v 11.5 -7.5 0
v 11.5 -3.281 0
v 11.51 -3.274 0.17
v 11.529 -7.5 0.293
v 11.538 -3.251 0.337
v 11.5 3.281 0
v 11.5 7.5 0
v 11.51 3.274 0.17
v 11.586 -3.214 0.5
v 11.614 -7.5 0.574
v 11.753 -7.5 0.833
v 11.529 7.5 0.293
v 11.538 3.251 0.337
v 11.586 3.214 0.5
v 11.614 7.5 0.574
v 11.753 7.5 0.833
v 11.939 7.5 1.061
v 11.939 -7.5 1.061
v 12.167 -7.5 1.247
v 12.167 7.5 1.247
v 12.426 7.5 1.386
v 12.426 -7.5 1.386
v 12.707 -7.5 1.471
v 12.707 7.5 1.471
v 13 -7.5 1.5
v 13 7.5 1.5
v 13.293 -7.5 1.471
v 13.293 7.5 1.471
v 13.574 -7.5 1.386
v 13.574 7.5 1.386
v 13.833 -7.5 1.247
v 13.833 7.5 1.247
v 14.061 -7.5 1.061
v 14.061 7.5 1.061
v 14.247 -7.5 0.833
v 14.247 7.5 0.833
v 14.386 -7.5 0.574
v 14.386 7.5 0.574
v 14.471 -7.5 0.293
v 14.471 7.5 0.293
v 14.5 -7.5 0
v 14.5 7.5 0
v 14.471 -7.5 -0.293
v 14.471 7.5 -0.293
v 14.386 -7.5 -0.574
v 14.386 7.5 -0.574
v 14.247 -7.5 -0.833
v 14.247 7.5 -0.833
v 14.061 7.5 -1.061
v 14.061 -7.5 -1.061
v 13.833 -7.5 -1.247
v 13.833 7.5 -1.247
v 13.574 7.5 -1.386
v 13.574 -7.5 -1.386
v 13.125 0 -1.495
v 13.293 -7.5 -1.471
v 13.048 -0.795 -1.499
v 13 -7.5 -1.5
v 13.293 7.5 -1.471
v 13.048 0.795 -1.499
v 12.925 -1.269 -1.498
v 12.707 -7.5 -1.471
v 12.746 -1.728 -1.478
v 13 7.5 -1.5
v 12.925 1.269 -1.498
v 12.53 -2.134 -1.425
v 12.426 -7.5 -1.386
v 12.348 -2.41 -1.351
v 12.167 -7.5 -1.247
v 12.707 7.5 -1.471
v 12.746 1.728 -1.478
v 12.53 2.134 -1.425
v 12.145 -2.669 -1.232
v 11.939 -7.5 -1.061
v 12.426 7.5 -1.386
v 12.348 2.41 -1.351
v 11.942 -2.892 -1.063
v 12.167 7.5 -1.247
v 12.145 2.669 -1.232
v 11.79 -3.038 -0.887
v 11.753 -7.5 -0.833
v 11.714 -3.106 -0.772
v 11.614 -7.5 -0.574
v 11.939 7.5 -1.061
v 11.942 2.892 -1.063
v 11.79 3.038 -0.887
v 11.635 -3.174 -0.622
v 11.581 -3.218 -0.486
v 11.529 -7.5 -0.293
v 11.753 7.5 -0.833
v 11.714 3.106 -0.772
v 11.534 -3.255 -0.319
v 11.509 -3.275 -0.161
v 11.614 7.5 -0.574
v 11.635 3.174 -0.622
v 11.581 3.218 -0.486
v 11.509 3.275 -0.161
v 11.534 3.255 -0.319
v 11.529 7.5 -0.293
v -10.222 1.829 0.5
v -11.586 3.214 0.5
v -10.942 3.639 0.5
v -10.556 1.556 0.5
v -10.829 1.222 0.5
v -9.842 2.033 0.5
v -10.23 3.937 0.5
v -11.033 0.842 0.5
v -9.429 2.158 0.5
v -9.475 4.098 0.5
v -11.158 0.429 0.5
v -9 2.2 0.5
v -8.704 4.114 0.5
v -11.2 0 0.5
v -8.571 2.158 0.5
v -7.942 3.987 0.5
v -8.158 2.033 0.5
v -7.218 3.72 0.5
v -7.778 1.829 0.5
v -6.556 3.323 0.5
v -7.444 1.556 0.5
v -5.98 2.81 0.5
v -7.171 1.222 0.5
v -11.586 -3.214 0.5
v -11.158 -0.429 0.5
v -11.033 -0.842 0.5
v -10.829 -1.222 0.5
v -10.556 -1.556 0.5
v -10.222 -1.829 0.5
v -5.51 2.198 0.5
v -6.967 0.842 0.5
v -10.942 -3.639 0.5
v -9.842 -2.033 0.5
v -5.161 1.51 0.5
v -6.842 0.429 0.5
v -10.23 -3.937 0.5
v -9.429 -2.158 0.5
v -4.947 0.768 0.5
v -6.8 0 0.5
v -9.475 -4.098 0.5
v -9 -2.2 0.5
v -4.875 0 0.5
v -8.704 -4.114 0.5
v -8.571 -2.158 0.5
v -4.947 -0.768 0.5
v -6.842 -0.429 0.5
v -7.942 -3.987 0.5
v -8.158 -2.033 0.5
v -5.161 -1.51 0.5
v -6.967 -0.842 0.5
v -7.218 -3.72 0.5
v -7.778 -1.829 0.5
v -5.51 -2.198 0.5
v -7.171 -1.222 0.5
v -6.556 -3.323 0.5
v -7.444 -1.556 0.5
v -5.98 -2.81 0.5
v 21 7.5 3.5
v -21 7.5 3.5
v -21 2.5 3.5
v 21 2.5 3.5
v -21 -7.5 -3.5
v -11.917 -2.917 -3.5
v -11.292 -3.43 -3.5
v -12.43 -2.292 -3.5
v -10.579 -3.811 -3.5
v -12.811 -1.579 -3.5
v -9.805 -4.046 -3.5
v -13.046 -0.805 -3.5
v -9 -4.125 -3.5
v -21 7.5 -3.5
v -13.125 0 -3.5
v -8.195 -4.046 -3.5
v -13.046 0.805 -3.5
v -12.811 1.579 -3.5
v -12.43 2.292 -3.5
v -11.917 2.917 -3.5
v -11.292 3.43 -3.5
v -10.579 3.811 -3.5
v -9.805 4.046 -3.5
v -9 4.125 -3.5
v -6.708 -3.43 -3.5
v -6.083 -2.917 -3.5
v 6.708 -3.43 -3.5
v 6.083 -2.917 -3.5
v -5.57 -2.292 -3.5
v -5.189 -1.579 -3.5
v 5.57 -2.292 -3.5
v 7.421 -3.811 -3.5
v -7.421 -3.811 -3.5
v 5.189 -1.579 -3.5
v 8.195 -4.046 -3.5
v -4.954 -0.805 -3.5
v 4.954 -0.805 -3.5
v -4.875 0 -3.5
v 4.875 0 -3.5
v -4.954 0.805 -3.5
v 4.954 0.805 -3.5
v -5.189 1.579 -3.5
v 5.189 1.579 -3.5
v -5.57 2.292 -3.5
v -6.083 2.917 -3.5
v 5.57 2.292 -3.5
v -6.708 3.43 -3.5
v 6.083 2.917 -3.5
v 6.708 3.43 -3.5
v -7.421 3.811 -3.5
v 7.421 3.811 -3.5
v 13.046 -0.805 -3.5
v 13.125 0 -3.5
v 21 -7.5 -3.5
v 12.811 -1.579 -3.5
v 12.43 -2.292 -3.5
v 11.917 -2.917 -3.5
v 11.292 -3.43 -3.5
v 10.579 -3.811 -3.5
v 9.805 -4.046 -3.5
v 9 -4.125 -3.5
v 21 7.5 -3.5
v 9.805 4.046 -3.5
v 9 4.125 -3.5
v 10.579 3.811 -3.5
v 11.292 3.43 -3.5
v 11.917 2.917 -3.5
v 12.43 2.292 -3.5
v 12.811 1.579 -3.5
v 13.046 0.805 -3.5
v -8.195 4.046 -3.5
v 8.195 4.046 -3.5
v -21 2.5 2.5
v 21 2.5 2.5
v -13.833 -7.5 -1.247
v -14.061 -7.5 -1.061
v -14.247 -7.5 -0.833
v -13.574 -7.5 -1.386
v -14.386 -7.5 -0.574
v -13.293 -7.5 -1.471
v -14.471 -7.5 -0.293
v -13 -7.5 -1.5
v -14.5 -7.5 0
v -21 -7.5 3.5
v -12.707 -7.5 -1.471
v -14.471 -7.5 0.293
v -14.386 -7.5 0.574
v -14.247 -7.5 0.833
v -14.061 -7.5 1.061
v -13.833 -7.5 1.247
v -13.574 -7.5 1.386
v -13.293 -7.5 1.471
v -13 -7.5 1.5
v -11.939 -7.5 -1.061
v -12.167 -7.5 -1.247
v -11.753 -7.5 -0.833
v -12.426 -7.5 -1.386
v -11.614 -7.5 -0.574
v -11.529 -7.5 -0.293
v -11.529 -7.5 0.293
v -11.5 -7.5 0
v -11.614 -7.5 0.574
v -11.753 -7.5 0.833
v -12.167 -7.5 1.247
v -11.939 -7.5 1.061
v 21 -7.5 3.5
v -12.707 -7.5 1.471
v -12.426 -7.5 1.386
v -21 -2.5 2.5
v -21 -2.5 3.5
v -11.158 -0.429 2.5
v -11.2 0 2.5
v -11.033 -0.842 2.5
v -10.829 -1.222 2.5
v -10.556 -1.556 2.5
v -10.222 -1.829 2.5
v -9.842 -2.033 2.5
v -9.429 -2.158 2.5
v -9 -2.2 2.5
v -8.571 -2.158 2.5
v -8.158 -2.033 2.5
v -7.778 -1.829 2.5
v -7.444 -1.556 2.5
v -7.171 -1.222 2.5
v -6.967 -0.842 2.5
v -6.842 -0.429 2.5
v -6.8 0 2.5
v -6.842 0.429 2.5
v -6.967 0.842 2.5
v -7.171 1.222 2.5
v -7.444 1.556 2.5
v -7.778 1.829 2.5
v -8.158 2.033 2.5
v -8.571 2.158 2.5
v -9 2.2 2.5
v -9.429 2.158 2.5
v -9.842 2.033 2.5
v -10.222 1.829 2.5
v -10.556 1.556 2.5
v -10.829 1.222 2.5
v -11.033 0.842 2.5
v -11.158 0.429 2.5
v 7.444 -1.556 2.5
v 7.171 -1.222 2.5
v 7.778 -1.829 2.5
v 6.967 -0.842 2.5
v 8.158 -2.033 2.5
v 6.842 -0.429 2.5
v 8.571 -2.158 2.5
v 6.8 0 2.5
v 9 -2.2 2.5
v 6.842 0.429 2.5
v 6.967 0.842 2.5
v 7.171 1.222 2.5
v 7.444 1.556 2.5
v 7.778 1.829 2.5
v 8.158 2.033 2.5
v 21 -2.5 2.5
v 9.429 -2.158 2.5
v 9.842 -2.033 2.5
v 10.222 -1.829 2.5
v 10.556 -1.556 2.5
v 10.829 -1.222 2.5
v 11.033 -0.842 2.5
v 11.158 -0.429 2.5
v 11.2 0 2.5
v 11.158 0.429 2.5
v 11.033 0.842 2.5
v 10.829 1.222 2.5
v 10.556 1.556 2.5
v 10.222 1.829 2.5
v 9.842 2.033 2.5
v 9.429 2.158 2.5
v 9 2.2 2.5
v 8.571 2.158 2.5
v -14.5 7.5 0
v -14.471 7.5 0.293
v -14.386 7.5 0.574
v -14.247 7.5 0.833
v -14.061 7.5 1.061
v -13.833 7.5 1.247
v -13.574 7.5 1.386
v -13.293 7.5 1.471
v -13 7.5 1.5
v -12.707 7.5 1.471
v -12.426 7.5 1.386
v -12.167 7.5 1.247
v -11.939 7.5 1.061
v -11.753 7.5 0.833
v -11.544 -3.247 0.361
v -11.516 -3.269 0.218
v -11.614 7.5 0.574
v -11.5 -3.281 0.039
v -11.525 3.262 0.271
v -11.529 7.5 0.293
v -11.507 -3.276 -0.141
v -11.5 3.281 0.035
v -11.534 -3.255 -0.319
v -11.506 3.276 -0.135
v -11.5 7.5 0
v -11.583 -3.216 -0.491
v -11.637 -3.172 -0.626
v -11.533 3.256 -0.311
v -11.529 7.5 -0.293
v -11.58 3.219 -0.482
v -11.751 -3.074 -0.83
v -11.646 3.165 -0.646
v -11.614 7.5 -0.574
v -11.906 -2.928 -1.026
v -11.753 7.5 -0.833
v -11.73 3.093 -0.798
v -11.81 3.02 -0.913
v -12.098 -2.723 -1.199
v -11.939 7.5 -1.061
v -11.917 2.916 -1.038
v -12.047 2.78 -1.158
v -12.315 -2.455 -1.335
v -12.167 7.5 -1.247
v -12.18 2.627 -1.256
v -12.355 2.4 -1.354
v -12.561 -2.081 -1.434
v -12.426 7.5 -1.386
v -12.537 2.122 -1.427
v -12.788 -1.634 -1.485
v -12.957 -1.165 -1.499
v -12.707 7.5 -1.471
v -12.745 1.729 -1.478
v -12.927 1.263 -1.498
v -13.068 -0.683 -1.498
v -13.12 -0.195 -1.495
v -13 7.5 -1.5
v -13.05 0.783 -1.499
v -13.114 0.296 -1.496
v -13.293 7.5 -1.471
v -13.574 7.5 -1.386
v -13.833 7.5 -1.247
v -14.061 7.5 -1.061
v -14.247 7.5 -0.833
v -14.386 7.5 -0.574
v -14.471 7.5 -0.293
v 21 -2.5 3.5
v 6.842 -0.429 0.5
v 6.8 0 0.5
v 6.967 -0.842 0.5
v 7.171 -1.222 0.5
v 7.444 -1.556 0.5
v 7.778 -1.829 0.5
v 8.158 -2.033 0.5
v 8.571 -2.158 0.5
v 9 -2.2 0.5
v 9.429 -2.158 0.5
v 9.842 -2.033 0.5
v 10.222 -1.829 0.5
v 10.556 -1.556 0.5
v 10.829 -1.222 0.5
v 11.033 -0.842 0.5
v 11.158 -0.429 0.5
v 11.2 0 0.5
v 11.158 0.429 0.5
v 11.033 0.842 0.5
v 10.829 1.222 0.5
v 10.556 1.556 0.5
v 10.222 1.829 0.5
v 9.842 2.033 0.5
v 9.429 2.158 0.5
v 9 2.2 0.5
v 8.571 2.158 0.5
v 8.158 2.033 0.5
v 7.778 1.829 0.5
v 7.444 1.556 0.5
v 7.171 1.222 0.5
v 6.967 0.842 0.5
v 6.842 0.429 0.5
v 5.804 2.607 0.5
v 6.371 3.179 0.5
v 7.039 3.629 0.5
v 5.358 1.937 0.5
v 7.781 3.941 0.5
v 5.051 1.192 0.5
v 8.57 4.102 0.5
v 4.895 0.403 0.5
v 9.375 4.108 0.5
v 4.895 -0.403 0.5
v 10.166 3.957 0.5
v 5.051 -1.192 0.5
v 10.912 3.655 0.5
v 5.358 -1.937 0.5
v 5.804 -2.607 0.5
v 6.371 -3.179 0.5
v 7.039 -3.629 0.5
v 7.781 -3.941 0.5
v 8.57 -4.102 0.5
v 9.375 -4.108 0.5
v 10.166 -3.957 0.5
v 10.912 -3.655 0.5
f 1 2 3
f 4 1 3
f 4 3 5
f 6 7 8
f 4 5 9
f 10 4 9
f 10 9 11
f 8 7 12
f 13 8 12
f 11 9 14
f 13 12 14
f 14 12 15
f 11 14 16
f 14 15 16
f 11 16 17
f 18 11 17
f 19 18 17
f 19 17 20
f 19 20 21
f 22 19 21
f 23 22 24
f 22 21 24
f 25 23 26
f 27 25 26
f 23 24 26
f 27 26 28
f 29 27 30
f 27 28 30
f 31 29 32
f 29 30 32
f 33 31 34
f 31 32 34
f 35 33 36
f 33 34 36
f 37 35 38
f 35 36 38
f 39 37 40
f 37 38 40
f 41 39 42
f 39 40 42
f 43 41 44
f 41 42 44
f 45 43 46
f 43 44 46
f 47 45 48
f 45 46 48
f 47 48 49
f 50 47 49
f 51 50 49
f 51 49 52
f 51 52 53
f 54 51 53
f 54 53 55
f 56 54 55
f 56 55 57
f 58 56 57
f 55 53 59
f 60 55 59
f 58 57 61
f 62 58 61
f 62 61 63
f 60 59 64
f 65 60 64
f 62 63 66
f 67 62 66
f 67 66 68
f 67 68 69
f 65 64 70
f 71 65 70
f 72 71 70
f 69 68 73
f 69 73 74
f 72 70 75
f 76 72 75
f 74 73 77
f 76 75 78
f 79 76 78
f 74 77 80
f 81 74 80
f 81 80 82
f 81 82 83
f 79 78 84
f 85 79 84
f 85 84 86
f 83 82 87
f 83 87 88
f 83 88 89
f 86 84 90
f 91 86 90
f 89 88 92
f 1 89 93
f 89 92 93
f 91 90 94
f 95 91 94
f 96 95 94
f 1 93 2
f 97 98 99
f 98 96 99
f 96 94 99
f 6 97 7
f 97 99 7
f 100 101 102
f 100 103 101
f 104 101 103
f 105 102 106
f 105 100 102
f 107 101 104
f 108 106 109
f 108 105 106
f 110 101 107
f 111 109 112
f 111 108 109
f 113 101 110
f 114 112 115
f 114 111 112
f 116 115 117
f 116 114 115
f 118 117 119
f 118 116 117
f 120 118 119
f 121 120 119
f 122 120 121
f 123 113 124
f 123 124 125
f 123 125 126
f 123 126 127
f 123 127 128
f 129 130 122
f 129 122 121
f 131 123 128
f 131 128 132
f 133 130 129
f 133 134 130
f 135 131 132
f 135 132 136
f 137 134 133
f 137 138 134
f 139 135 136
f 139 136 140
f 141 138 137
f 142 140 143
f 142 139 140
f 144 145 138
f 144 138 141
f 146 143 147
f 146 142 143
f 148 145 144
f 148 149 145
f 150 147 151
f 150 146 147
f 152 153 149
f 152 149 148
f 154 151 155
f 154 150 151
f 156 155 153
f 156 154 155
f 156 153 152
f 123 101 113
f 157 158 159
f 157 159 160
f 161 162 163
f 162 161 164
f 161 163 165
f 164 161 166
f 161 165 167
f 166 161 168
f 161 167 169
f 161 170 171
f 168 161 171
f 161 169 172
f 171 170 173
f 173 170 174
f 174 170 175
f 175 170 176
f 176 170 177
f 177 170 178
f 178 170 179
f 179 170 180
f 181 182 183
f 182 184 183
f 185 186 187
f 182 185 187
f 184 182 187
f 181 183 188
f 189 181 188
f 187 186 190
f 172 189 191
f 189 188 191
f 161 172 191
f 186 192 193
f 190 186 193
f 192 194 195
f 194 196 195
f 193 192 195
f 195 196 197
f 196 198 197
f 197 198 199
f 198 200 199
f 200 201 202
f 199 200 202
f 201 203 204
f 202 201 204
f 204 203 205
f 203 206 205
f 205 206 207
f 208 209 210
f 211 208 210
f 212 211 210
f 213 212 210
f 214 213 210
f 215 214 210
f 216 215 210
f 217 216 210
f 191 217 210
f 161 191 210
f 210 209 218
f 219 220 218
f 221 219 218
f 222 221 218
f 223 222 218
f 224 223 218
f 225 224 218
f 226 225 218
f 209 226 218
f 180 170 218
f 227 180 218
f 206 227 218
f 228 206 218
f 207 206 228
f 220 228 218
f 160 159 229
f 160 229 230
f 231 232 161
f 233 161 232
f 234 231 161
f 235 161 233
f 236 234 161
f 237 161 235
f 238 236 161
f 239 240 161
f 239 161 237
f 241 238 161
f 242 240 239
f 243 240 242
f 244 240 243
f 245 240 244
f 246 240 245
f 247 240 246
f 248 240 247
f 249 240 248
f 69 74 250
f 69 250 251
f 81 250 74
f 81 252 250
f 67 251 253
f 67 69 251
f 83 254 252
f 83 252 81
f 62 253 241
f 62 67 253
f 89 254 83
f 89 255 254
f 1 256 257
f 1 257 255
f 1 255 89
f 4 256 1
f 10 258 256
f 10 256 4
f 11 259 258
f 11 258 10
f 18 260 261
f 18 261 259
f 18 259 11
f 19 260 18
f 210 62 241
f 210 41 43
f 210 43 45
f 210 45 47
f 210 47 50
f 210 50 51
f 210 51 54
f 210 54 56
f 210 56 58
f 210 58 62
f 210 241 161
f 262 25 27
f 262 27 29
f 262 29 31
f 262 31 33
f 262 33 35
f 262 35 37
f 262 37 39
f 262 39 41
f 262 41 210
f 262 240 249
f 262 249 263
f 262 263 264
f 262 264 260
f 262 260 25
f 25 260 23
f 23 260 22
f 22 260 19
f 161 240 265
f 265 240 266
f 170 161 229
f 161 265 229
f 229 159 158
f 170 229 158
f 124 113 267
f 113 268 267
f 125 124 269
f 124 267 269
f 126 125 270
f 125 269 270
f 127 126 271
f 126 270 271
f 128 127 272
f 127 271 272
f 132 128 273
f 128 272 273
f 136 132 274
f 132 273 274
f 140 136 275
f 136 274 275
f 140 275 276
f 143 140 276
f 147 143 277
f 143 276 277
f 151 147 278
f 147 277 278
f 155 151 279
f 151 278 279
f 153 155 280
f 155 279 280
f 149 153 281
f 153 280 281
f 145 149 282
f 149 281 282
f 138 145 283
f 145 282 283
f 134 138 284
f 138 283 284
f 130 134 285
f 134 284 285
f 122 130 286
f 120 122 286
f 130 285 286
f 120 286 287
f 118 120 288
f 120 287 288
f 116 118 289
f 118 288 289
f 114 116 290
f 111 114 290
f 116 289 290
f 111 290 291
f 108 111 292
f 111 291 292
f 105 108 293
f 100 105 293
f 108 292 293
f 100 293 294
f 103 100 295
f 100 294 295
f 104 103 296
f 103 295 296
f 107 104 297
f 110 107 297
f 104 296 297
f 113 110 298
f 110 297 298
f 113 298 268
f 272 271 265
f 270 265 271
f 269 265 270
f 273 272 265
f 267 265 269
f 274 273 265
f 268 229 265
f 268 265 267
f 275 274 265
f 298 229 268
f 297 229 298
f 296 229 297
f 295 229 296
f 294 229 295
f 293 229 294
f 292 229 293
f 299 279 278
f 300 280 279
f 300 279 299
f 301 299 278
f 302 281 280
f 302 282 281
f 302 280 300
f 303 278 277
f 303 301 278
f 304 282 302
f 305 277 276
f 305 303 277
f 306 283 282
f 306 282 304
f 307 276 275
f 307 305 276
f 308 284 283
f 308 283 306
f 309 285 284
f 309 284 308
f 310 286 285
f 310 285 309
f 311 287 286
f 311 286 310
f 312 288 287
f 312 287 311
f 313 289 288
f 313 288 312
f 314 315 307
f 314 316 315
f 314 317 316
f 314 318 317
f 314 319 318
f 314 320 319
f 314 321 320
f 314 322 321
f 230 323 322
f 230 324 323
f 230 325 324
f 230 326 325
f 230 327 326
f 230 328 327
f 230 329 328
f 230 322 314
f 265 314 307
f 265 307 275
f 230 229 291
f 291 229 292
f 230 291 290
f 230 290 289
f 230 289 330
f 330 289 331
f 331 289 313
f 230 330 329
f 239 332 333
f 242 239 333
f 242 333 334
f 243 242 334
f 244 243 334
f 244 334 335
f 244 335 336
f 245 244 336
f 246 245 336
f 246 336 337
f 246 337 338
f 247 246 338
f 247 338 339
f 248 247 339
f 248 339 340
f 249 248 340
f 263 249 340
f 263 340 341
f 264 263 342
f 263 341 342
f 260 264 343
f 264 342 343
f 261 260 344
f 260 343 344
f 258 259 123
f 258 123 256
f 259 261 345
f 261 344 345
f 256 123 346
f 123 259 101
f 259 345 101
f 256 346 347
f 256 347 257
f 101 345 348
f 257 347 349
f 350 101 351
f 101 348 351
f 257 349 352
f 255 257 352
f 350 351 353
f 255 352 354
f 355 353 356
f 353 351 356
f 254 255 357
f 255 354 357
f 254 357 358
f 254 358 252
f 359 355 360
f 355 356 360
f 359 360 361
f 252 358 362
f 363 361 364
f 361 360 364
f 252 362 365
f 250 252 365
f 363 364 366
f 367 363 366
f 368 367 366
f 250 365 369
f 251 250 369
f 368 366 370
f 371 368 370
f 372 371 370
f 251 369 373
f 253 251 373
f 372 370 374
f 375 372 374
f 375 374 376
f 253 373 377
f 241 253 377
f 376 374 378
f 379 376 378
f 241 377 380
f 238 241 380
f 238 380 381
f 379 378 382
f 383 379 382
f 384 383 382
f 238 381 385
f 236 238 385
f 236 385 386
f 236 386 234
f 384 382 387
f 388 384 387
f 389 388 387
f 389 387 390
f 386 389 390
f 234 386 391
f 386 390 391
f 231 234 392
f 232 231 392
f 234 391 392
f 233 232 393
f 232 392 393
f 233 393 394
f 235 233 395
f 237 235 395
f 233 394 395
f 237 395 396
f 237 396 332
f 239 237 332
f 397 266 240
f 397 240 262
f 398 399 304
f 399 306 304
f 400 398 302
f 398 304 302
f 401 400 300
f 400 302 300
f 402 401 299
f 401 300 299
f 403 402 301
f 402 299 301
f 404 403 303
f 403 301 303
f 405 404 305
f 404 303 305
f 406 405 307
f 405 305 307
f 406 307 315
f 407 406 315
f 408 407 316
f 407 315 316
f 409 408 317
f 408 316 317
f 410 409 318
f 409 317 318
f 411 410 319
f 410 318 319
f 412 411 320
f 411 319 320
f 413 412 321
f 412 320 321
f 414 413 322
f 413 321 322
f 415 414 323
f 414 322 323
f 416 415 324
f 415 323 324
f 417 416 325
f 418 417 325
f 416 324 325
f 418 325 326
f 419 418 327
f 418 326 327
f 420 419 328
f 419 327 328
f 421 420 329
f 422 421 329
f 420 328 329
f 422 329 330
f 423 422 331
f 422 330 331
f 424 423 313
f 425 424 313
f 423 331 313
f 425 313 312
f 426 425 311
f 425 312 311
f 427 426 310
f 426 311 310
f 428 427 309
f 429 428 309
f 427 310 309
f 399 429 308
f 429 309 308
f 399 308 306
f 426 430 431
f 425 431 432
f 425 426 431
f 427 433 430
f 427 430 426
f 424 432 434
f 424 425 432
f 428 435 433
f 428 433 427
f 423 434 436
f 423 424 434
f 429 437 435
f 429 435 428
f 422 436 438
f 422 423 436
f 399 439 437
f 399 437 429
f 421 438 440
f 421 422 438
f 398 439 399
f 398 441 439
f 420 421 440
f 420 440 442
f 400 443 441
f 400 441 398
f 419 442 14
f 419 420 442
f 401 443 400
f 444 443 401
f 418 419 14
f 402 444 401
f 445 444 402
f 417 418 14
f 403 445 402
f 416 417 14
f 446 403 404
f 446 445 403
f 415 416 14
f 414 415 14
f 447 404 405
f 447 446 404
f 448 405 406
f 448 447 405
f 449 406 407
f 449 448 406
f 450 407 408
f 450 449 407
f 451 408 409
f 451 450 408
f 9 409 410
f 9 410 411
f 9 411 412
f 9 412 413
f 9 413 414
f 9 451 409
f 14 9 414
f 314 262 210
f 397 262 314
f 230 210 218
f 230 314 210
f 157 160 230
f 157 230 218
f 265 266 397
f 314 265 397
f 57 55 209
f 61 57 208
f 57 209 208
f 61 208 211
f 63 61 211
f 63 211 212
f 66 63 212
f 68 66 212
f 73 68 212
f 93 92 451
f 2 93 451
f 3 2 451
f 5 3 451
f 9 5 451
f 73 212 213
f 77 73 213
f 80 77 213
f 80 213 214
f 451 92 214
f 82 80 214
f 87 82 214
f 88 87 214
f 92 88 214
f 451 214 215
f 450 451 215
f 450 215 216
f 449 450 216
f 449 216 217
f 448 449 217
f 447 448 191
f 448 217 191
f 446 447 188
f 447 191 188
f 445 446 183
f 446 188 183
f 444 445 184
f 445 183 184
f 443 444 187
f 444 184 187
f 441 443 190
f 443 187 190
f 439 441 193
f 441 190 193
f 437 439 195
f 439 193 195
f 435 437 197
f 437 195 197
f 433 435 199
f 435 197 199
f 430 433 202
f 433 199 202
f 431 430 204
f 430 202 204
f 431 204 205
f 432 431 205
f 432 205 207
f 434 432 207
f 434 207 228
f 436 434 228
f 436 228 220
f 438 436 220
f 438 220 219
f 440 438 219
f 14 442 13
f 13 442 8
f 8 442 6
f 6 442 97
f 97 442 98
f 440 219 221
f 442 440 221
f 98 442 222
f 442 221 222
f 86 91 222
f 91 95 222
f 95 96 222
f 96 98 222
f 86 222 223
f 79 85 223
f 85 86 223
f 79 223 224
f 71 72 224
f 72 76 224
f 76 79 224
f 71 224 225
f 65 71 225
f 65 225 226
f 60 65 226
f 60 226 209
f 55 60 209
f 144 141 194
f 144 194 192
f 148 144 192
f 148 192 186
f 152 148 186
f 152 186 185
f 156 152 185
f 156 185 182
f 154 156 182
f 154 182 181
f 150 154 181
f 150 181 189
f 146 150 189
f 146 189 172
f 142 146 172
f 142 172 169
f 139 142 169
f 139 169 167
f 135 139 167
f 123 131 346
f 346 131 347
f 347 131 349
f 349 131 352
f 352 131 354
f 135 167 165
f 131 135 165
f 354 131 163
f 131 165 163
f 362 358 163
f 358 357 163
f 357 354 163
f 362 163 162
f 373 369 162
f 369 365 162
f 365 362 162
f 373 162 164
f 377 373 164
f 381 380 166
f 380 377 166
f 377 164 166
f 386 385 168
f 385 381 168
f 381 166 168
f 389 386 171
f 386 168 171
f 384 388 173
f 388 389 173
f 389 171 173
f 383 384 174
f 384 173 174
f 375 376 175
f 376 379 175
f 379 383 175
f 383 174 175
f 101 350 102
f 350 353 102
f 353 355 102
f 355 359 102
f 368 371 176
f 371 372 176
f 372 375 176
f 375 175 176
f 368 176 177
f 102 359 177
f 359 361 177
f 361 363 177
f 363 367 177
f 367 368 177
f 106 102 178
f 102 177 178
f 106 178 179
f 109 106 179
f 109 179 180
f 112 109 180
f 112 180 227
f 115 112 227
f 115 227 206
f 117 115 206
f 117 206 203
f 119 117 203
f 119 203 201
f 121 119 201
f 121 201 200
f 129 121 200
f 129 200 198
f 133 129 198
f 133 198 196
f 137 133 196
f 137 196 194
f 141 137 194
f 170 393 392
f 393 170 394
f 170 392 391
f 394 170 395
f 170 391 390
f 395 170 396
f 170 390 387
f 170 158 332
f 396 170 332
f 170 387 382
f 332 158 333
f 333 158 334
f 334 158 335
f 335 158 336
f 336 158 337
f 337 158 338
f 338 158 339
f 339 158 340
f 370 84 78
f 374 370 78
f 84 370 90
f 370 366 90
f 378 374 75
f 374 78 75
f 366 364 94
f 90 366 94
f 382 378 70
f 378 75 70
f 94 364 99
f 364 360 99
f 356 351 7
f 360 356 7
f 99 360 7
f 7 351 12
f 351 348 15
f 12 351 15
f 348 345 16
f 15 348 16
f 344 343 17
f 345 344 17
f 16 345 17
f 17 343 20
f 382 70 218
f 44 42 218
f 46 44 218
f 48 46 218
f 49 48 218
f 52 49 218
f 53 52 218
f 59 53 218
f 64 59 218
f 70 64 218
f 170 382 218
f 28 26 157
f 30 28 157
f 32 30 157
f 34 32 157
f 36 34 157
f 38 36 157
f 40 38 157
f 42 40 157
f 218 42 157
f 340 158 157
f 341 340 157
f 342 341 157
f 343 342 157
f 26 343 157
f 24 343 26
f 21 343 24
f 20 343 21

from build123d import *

# Parameters (mm, degrees)
F0_W           = 42
F0_H           = 15
F1_DEPTH       = 3.5
F2_W           = 42
F2_H           = 5
F3_DEPTH       = 1
F5_D           = 4.4
F5_CBORE_D     = 8.25
F5_CBORE_DEPTH = 4
F6_R           = 1.5
F7_DEPTH       = 15.001


with BuildPart() as f1:
    # F0 (on Top) → F1 (new body, symmetric)
    with BuildSketch(Plane.XY):
        Rectangle(F0_W, F0_H)
    extrude(amount=F1_DEPTH, both=True)

    # F2 (on face) → F3 (cut)
    with BuildSketch(Plane.XY.offset(3.5)):
        Rectangle(F2_W, F2_H)
    extrude(amount=-F3_DEPTH, mode=Mode.SUBTRACT)

    # F5 (through all)
    with Locations(Plane(origin=(0, 0, -3.5), x_dir=(1, 0, 0), z_dir=(0, 0, -1))):
        with Locations((9, 0), (-9, 0)):
            CounterBoreHole(F5_D / 2, F5_CBORE_D / 2, F5_CBORE_DEPTH)

    # F6 (on face) → F7 (cut, through all)
    with BuildSketch(Plane(origin=(0, 7.5, 0), x_dir=(-1, 0, 0), z_dir=(0, 1, 0))):
        with Locations((-13, 0)):
            Circle(F6_R)
        with Locations((13, 0)):
            Circle(F6_R)
    extrude(amount=-F7_DEPTH, mode=Mode.SUBTRACT)


solid = f1.part
